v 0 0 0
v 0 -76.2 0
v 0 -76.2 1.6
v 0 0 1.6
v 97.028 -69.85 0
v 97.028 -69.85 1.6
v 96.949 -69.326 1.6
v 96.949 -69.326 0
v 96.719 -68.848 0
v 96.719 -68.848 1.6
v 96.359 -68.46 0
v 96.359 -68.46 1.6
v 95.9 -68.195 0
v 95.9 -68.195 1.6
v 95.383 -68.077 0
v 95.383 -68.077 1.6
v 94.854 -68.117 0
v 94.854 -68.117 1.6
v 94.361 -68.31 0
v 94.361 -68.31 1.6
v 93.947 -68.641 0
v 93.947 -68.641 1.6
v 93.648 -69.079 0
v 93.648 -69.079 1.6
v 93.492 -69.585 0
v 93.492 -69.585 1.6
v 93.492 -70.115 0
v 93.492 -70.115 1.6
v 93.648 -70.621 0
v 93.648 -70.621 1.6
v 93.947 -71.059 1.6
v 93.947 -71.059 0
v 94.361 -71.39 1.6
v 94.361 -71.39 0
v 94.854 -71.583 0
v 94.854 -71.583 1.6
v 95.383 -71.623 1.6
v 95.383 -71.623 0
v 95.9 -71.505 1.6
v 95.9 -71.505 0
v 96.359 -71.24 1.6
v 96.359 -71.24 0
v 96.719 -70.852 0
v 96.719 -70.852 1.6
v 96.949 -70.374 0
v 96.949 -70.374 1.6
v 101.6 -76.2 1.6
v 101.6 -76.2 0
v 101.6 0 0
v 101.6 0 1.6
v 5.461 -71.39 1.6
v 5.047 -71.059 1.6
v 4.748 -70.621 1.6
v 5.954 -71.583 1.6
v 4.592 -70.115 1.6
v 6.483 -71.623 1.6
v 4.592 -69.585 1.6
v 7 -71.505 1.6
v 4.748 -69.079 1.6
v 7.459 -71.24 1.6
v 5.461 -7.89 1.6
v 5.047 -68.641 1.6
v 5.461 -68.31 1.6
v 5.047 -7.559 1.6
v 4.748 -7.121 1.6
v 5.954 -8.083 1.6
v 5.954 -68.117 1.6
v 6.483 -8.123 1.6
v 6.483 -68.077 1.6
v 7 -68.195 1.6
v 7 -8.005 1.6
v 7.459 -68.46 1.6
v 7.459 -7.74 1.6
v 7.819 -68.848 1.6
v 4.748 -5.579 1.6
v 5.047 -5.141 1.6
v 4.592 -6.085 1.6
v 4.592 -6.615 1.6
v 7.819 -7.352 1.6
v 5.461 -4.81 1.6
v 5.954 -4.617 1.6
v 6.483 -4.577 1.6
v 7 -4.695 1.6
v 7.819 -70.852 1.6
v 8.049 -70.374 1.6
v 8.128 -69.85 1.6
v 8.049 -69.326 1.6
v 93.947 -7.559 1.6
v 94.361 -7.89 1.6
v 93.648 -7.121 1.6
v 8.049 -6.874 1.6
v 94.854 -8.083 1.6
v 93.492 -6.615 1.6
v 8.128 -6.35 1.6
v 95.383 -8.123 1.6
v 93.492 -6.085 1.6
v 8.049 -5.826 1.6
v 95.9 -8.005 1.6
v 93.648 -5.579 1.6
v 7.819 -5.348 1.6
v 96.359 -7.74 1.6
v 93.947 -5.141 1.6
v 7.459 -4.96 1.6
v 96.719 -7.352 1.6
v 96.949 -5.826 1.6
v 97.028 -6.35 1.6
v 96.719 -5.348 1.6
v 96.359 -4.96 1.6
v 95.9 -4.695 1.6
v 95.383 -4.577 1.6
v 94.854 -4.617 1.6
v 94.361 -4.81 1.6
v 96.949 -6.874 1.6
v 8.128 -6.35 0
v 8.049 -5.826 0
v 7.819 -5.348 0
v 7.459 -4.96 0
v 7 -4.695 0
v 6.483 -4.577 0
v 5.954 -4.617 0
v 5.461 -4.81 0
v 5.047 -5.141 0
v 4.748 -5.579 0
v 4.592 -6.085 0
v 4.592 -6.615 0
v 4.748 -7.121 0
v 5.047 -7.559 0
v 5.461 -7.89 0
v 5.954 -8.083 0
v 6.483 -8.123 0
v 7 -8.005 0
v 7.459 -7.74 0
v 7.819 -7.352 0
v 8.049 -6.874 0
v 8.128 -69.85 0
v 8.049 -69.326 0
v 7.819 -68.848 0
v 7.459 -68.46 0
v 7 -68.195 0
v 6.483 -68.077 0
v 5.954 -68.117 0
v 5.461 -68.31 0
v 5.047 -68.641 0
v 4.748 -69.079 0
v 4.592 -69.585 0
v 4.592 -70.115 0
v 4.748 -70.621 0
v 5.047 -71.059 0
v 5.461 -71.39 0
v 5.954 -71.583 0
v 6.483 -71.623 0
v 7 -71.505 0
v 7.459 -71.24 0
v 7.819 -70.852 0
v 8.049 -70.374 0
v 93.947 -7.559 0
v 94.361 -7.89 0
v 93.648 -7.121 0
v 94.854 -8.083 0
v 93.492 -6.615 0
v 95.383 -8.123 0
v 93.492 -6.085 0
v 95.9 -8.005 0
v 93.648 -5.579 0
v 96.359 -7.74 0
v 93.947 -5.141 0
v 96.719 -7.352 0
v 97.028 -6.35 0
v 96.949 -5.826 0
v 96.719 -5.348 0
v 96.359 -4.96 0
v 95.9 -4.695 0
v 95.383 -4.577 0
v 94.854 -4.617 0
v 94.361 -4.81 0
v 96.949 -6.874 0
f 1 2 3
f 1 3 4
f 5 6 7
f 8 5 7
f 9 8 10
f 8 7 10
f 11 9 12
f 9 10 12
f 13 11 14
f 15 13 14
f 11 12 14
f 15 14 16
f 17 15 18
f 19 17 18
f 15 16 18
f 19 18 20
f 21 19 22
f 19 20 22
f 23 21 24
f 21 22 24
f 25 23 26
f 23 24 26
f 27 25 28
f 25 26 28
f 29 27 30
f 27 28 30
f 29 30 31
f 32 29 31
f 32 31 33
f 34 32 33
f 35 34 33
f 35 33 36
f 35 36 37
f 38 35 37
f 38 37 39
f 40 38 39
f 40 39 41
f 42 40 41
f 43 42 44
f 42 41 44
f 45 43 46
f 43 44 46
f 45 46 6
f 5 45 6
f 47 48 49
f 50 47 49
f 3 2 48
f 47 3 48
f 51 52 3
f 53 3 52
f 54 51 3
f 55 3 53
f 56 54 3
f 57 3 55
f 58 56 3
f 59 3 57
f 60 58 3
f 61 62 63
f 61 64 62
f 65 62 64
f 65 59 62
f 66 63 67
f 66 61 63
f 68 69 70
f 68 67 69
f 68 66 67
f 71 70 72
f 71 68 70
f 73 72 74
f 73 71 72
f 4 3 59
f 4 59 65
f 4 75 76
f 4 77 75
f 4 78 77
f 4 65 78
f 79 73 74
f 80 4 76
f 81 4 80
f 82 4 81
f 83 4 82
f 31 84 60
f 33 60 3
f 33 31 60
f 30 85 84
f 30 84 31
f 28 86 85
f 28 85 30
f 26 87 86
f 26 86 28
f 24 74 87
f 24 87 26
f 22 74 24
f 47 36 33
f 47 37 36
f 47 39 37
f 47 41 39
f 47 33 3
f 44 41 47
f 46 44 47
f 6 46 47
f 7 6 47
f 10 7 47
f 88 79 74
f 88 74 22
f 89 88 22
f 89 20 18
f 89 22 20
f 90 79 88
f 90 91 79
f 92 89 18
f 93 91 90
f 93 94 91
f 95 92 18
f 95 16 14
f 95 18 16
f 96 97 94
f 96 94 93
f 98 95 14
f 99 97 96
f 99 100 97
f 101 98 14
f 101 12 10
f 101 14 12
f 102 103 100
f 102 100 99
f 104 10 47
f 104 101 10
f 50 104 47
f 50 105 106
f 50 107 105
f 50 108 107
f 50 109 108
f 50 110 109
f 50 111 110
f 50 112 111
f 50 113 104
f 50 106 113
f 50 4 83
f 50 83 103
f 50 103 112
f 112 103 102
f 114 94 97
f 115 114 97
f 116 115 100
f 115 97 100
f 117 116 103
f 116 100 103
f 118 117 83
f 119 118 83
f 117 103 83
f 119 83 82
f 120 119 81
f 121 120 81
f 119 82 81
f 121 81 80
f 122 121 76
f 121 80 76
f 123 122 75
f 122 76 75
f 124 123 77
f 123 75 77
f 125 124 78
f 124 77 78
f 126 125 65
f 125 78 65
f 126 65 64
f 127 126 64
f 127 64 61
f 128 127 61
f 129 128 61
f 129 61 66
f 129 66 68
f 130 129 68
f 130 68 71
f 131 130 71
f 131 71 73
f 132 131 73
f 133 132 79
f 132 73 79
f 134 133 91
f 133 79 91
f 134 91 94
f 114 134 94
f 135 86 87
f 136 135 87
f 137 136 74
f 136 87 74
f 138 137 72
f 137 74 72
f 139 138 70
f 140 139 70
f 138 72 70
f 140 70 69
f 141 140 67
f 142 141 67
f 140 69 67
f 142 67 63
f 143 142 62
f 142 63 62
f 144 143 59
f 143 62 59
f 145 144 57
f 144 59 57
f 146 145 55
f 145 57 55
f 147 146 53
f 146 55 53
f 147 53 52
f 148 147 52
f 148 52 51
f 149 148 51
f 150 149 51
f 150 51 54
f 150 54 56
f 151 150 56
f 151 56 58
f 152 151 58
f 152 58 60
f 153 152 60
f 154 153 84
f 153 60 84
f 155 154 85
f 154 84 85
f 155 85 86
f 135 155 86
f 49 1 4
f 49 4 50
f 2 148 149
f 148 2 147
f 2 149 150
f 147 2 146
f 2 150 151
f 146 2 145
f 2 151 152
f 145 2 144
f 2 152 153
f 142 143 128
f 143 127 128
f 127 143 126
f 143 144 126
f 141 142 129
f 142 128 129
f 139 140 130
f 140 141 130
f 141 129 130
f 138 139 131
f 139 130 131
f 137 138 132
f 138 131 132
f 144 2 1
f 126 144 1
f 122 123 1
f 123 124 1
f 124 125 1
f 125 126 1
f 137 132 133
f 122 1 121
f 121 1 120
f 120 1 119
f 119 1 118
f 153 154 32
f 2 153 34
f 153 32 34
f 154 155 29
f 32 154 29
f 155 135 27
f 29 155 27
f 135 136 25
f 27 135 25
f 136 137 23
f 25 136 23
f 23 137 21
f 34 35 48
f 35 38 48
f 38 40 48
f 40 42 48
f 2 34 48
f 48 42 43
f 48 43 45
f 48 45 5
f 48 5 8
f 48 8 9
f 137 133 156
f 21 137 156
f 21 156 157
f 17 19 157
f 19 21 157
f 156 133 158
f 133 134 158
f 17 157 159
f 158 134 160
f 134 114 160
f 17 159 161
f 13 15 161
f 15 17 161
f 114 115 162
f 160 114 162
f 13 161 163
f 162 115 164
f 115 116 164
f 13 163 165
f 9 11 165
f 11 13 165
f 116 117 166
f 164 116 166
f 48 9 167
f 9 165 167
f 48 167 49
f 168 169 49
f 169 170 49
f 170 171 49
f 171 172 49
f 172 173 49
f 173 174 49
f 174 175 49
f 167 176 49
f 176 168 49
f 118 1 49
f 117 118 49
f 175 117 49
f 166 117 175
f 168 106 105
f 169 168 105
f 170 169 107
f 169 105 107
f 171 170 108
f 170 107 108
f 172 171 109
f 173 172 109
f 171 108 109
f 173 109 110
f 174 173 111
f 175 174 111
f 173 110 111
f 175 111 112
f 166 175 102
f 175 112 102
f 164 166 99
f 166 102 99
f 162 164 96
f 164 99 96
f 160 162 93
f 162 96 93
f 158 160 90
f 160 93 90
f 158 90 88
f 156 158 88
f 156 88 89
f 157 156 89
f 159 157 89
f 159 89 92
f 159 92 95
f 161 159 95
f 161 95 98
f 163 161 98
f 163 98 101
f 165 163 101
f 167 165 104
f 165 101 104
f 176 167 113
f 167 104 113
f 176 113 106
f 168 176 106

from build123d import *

# Parameters (mm, degrees)
SKETCH1_W            = 101.6
SKETCH1_H            = 76.2
EXTRUDE1_DEPTH       = 1.6002
SKETCH2_R            = 1.778
CUT_EXTRUDE1_DEPTH   = 1.6002
LPATTERN1_COUNT      = 2
LPATTERN1_PITCH      = 63.5
LPATTERN1_COUNT_DIR2 = 2
LPATTERN1_PITCH_DIR2 = 88.9


with BuildPart() as part:
    # Sketch1 → Extrude1 (new body)
    with BuildSketch(Plane.XY):
        with Locations((50.8, -38.1)):
            Rectangle(SKETCH1_W, SKETCH1_H)
    extrude(amount=EXTRUDE1_DEPTH)

    # Sketch2 → Cut-Extrude1 (cut)
    with BuildSketch(Plane.XY.offset(1.6002)):
        with Locations((6.35, -69.85)):
            Circle(SKETCH2_R)
    cut_extrude1 = extrude(amount=-CUT_EXTRUDE1_DEPTH, mode=Mode.SUBTRACT)

    # LPattern1: Cut-Extrude1 2 × 2
    with Locations(*[(j * LPATTERN1_PITCH_DIR2, i * LPATTERN1_PITCH, 0) for i in range(LPATTERN1_COUNT) for j in range(LPATTERN1_COUNT_DIR2) if (i, j) != (0, 0)]):
        add(cut_extrude1, mode=Mode.SUBTRACT)


solid = part.part
